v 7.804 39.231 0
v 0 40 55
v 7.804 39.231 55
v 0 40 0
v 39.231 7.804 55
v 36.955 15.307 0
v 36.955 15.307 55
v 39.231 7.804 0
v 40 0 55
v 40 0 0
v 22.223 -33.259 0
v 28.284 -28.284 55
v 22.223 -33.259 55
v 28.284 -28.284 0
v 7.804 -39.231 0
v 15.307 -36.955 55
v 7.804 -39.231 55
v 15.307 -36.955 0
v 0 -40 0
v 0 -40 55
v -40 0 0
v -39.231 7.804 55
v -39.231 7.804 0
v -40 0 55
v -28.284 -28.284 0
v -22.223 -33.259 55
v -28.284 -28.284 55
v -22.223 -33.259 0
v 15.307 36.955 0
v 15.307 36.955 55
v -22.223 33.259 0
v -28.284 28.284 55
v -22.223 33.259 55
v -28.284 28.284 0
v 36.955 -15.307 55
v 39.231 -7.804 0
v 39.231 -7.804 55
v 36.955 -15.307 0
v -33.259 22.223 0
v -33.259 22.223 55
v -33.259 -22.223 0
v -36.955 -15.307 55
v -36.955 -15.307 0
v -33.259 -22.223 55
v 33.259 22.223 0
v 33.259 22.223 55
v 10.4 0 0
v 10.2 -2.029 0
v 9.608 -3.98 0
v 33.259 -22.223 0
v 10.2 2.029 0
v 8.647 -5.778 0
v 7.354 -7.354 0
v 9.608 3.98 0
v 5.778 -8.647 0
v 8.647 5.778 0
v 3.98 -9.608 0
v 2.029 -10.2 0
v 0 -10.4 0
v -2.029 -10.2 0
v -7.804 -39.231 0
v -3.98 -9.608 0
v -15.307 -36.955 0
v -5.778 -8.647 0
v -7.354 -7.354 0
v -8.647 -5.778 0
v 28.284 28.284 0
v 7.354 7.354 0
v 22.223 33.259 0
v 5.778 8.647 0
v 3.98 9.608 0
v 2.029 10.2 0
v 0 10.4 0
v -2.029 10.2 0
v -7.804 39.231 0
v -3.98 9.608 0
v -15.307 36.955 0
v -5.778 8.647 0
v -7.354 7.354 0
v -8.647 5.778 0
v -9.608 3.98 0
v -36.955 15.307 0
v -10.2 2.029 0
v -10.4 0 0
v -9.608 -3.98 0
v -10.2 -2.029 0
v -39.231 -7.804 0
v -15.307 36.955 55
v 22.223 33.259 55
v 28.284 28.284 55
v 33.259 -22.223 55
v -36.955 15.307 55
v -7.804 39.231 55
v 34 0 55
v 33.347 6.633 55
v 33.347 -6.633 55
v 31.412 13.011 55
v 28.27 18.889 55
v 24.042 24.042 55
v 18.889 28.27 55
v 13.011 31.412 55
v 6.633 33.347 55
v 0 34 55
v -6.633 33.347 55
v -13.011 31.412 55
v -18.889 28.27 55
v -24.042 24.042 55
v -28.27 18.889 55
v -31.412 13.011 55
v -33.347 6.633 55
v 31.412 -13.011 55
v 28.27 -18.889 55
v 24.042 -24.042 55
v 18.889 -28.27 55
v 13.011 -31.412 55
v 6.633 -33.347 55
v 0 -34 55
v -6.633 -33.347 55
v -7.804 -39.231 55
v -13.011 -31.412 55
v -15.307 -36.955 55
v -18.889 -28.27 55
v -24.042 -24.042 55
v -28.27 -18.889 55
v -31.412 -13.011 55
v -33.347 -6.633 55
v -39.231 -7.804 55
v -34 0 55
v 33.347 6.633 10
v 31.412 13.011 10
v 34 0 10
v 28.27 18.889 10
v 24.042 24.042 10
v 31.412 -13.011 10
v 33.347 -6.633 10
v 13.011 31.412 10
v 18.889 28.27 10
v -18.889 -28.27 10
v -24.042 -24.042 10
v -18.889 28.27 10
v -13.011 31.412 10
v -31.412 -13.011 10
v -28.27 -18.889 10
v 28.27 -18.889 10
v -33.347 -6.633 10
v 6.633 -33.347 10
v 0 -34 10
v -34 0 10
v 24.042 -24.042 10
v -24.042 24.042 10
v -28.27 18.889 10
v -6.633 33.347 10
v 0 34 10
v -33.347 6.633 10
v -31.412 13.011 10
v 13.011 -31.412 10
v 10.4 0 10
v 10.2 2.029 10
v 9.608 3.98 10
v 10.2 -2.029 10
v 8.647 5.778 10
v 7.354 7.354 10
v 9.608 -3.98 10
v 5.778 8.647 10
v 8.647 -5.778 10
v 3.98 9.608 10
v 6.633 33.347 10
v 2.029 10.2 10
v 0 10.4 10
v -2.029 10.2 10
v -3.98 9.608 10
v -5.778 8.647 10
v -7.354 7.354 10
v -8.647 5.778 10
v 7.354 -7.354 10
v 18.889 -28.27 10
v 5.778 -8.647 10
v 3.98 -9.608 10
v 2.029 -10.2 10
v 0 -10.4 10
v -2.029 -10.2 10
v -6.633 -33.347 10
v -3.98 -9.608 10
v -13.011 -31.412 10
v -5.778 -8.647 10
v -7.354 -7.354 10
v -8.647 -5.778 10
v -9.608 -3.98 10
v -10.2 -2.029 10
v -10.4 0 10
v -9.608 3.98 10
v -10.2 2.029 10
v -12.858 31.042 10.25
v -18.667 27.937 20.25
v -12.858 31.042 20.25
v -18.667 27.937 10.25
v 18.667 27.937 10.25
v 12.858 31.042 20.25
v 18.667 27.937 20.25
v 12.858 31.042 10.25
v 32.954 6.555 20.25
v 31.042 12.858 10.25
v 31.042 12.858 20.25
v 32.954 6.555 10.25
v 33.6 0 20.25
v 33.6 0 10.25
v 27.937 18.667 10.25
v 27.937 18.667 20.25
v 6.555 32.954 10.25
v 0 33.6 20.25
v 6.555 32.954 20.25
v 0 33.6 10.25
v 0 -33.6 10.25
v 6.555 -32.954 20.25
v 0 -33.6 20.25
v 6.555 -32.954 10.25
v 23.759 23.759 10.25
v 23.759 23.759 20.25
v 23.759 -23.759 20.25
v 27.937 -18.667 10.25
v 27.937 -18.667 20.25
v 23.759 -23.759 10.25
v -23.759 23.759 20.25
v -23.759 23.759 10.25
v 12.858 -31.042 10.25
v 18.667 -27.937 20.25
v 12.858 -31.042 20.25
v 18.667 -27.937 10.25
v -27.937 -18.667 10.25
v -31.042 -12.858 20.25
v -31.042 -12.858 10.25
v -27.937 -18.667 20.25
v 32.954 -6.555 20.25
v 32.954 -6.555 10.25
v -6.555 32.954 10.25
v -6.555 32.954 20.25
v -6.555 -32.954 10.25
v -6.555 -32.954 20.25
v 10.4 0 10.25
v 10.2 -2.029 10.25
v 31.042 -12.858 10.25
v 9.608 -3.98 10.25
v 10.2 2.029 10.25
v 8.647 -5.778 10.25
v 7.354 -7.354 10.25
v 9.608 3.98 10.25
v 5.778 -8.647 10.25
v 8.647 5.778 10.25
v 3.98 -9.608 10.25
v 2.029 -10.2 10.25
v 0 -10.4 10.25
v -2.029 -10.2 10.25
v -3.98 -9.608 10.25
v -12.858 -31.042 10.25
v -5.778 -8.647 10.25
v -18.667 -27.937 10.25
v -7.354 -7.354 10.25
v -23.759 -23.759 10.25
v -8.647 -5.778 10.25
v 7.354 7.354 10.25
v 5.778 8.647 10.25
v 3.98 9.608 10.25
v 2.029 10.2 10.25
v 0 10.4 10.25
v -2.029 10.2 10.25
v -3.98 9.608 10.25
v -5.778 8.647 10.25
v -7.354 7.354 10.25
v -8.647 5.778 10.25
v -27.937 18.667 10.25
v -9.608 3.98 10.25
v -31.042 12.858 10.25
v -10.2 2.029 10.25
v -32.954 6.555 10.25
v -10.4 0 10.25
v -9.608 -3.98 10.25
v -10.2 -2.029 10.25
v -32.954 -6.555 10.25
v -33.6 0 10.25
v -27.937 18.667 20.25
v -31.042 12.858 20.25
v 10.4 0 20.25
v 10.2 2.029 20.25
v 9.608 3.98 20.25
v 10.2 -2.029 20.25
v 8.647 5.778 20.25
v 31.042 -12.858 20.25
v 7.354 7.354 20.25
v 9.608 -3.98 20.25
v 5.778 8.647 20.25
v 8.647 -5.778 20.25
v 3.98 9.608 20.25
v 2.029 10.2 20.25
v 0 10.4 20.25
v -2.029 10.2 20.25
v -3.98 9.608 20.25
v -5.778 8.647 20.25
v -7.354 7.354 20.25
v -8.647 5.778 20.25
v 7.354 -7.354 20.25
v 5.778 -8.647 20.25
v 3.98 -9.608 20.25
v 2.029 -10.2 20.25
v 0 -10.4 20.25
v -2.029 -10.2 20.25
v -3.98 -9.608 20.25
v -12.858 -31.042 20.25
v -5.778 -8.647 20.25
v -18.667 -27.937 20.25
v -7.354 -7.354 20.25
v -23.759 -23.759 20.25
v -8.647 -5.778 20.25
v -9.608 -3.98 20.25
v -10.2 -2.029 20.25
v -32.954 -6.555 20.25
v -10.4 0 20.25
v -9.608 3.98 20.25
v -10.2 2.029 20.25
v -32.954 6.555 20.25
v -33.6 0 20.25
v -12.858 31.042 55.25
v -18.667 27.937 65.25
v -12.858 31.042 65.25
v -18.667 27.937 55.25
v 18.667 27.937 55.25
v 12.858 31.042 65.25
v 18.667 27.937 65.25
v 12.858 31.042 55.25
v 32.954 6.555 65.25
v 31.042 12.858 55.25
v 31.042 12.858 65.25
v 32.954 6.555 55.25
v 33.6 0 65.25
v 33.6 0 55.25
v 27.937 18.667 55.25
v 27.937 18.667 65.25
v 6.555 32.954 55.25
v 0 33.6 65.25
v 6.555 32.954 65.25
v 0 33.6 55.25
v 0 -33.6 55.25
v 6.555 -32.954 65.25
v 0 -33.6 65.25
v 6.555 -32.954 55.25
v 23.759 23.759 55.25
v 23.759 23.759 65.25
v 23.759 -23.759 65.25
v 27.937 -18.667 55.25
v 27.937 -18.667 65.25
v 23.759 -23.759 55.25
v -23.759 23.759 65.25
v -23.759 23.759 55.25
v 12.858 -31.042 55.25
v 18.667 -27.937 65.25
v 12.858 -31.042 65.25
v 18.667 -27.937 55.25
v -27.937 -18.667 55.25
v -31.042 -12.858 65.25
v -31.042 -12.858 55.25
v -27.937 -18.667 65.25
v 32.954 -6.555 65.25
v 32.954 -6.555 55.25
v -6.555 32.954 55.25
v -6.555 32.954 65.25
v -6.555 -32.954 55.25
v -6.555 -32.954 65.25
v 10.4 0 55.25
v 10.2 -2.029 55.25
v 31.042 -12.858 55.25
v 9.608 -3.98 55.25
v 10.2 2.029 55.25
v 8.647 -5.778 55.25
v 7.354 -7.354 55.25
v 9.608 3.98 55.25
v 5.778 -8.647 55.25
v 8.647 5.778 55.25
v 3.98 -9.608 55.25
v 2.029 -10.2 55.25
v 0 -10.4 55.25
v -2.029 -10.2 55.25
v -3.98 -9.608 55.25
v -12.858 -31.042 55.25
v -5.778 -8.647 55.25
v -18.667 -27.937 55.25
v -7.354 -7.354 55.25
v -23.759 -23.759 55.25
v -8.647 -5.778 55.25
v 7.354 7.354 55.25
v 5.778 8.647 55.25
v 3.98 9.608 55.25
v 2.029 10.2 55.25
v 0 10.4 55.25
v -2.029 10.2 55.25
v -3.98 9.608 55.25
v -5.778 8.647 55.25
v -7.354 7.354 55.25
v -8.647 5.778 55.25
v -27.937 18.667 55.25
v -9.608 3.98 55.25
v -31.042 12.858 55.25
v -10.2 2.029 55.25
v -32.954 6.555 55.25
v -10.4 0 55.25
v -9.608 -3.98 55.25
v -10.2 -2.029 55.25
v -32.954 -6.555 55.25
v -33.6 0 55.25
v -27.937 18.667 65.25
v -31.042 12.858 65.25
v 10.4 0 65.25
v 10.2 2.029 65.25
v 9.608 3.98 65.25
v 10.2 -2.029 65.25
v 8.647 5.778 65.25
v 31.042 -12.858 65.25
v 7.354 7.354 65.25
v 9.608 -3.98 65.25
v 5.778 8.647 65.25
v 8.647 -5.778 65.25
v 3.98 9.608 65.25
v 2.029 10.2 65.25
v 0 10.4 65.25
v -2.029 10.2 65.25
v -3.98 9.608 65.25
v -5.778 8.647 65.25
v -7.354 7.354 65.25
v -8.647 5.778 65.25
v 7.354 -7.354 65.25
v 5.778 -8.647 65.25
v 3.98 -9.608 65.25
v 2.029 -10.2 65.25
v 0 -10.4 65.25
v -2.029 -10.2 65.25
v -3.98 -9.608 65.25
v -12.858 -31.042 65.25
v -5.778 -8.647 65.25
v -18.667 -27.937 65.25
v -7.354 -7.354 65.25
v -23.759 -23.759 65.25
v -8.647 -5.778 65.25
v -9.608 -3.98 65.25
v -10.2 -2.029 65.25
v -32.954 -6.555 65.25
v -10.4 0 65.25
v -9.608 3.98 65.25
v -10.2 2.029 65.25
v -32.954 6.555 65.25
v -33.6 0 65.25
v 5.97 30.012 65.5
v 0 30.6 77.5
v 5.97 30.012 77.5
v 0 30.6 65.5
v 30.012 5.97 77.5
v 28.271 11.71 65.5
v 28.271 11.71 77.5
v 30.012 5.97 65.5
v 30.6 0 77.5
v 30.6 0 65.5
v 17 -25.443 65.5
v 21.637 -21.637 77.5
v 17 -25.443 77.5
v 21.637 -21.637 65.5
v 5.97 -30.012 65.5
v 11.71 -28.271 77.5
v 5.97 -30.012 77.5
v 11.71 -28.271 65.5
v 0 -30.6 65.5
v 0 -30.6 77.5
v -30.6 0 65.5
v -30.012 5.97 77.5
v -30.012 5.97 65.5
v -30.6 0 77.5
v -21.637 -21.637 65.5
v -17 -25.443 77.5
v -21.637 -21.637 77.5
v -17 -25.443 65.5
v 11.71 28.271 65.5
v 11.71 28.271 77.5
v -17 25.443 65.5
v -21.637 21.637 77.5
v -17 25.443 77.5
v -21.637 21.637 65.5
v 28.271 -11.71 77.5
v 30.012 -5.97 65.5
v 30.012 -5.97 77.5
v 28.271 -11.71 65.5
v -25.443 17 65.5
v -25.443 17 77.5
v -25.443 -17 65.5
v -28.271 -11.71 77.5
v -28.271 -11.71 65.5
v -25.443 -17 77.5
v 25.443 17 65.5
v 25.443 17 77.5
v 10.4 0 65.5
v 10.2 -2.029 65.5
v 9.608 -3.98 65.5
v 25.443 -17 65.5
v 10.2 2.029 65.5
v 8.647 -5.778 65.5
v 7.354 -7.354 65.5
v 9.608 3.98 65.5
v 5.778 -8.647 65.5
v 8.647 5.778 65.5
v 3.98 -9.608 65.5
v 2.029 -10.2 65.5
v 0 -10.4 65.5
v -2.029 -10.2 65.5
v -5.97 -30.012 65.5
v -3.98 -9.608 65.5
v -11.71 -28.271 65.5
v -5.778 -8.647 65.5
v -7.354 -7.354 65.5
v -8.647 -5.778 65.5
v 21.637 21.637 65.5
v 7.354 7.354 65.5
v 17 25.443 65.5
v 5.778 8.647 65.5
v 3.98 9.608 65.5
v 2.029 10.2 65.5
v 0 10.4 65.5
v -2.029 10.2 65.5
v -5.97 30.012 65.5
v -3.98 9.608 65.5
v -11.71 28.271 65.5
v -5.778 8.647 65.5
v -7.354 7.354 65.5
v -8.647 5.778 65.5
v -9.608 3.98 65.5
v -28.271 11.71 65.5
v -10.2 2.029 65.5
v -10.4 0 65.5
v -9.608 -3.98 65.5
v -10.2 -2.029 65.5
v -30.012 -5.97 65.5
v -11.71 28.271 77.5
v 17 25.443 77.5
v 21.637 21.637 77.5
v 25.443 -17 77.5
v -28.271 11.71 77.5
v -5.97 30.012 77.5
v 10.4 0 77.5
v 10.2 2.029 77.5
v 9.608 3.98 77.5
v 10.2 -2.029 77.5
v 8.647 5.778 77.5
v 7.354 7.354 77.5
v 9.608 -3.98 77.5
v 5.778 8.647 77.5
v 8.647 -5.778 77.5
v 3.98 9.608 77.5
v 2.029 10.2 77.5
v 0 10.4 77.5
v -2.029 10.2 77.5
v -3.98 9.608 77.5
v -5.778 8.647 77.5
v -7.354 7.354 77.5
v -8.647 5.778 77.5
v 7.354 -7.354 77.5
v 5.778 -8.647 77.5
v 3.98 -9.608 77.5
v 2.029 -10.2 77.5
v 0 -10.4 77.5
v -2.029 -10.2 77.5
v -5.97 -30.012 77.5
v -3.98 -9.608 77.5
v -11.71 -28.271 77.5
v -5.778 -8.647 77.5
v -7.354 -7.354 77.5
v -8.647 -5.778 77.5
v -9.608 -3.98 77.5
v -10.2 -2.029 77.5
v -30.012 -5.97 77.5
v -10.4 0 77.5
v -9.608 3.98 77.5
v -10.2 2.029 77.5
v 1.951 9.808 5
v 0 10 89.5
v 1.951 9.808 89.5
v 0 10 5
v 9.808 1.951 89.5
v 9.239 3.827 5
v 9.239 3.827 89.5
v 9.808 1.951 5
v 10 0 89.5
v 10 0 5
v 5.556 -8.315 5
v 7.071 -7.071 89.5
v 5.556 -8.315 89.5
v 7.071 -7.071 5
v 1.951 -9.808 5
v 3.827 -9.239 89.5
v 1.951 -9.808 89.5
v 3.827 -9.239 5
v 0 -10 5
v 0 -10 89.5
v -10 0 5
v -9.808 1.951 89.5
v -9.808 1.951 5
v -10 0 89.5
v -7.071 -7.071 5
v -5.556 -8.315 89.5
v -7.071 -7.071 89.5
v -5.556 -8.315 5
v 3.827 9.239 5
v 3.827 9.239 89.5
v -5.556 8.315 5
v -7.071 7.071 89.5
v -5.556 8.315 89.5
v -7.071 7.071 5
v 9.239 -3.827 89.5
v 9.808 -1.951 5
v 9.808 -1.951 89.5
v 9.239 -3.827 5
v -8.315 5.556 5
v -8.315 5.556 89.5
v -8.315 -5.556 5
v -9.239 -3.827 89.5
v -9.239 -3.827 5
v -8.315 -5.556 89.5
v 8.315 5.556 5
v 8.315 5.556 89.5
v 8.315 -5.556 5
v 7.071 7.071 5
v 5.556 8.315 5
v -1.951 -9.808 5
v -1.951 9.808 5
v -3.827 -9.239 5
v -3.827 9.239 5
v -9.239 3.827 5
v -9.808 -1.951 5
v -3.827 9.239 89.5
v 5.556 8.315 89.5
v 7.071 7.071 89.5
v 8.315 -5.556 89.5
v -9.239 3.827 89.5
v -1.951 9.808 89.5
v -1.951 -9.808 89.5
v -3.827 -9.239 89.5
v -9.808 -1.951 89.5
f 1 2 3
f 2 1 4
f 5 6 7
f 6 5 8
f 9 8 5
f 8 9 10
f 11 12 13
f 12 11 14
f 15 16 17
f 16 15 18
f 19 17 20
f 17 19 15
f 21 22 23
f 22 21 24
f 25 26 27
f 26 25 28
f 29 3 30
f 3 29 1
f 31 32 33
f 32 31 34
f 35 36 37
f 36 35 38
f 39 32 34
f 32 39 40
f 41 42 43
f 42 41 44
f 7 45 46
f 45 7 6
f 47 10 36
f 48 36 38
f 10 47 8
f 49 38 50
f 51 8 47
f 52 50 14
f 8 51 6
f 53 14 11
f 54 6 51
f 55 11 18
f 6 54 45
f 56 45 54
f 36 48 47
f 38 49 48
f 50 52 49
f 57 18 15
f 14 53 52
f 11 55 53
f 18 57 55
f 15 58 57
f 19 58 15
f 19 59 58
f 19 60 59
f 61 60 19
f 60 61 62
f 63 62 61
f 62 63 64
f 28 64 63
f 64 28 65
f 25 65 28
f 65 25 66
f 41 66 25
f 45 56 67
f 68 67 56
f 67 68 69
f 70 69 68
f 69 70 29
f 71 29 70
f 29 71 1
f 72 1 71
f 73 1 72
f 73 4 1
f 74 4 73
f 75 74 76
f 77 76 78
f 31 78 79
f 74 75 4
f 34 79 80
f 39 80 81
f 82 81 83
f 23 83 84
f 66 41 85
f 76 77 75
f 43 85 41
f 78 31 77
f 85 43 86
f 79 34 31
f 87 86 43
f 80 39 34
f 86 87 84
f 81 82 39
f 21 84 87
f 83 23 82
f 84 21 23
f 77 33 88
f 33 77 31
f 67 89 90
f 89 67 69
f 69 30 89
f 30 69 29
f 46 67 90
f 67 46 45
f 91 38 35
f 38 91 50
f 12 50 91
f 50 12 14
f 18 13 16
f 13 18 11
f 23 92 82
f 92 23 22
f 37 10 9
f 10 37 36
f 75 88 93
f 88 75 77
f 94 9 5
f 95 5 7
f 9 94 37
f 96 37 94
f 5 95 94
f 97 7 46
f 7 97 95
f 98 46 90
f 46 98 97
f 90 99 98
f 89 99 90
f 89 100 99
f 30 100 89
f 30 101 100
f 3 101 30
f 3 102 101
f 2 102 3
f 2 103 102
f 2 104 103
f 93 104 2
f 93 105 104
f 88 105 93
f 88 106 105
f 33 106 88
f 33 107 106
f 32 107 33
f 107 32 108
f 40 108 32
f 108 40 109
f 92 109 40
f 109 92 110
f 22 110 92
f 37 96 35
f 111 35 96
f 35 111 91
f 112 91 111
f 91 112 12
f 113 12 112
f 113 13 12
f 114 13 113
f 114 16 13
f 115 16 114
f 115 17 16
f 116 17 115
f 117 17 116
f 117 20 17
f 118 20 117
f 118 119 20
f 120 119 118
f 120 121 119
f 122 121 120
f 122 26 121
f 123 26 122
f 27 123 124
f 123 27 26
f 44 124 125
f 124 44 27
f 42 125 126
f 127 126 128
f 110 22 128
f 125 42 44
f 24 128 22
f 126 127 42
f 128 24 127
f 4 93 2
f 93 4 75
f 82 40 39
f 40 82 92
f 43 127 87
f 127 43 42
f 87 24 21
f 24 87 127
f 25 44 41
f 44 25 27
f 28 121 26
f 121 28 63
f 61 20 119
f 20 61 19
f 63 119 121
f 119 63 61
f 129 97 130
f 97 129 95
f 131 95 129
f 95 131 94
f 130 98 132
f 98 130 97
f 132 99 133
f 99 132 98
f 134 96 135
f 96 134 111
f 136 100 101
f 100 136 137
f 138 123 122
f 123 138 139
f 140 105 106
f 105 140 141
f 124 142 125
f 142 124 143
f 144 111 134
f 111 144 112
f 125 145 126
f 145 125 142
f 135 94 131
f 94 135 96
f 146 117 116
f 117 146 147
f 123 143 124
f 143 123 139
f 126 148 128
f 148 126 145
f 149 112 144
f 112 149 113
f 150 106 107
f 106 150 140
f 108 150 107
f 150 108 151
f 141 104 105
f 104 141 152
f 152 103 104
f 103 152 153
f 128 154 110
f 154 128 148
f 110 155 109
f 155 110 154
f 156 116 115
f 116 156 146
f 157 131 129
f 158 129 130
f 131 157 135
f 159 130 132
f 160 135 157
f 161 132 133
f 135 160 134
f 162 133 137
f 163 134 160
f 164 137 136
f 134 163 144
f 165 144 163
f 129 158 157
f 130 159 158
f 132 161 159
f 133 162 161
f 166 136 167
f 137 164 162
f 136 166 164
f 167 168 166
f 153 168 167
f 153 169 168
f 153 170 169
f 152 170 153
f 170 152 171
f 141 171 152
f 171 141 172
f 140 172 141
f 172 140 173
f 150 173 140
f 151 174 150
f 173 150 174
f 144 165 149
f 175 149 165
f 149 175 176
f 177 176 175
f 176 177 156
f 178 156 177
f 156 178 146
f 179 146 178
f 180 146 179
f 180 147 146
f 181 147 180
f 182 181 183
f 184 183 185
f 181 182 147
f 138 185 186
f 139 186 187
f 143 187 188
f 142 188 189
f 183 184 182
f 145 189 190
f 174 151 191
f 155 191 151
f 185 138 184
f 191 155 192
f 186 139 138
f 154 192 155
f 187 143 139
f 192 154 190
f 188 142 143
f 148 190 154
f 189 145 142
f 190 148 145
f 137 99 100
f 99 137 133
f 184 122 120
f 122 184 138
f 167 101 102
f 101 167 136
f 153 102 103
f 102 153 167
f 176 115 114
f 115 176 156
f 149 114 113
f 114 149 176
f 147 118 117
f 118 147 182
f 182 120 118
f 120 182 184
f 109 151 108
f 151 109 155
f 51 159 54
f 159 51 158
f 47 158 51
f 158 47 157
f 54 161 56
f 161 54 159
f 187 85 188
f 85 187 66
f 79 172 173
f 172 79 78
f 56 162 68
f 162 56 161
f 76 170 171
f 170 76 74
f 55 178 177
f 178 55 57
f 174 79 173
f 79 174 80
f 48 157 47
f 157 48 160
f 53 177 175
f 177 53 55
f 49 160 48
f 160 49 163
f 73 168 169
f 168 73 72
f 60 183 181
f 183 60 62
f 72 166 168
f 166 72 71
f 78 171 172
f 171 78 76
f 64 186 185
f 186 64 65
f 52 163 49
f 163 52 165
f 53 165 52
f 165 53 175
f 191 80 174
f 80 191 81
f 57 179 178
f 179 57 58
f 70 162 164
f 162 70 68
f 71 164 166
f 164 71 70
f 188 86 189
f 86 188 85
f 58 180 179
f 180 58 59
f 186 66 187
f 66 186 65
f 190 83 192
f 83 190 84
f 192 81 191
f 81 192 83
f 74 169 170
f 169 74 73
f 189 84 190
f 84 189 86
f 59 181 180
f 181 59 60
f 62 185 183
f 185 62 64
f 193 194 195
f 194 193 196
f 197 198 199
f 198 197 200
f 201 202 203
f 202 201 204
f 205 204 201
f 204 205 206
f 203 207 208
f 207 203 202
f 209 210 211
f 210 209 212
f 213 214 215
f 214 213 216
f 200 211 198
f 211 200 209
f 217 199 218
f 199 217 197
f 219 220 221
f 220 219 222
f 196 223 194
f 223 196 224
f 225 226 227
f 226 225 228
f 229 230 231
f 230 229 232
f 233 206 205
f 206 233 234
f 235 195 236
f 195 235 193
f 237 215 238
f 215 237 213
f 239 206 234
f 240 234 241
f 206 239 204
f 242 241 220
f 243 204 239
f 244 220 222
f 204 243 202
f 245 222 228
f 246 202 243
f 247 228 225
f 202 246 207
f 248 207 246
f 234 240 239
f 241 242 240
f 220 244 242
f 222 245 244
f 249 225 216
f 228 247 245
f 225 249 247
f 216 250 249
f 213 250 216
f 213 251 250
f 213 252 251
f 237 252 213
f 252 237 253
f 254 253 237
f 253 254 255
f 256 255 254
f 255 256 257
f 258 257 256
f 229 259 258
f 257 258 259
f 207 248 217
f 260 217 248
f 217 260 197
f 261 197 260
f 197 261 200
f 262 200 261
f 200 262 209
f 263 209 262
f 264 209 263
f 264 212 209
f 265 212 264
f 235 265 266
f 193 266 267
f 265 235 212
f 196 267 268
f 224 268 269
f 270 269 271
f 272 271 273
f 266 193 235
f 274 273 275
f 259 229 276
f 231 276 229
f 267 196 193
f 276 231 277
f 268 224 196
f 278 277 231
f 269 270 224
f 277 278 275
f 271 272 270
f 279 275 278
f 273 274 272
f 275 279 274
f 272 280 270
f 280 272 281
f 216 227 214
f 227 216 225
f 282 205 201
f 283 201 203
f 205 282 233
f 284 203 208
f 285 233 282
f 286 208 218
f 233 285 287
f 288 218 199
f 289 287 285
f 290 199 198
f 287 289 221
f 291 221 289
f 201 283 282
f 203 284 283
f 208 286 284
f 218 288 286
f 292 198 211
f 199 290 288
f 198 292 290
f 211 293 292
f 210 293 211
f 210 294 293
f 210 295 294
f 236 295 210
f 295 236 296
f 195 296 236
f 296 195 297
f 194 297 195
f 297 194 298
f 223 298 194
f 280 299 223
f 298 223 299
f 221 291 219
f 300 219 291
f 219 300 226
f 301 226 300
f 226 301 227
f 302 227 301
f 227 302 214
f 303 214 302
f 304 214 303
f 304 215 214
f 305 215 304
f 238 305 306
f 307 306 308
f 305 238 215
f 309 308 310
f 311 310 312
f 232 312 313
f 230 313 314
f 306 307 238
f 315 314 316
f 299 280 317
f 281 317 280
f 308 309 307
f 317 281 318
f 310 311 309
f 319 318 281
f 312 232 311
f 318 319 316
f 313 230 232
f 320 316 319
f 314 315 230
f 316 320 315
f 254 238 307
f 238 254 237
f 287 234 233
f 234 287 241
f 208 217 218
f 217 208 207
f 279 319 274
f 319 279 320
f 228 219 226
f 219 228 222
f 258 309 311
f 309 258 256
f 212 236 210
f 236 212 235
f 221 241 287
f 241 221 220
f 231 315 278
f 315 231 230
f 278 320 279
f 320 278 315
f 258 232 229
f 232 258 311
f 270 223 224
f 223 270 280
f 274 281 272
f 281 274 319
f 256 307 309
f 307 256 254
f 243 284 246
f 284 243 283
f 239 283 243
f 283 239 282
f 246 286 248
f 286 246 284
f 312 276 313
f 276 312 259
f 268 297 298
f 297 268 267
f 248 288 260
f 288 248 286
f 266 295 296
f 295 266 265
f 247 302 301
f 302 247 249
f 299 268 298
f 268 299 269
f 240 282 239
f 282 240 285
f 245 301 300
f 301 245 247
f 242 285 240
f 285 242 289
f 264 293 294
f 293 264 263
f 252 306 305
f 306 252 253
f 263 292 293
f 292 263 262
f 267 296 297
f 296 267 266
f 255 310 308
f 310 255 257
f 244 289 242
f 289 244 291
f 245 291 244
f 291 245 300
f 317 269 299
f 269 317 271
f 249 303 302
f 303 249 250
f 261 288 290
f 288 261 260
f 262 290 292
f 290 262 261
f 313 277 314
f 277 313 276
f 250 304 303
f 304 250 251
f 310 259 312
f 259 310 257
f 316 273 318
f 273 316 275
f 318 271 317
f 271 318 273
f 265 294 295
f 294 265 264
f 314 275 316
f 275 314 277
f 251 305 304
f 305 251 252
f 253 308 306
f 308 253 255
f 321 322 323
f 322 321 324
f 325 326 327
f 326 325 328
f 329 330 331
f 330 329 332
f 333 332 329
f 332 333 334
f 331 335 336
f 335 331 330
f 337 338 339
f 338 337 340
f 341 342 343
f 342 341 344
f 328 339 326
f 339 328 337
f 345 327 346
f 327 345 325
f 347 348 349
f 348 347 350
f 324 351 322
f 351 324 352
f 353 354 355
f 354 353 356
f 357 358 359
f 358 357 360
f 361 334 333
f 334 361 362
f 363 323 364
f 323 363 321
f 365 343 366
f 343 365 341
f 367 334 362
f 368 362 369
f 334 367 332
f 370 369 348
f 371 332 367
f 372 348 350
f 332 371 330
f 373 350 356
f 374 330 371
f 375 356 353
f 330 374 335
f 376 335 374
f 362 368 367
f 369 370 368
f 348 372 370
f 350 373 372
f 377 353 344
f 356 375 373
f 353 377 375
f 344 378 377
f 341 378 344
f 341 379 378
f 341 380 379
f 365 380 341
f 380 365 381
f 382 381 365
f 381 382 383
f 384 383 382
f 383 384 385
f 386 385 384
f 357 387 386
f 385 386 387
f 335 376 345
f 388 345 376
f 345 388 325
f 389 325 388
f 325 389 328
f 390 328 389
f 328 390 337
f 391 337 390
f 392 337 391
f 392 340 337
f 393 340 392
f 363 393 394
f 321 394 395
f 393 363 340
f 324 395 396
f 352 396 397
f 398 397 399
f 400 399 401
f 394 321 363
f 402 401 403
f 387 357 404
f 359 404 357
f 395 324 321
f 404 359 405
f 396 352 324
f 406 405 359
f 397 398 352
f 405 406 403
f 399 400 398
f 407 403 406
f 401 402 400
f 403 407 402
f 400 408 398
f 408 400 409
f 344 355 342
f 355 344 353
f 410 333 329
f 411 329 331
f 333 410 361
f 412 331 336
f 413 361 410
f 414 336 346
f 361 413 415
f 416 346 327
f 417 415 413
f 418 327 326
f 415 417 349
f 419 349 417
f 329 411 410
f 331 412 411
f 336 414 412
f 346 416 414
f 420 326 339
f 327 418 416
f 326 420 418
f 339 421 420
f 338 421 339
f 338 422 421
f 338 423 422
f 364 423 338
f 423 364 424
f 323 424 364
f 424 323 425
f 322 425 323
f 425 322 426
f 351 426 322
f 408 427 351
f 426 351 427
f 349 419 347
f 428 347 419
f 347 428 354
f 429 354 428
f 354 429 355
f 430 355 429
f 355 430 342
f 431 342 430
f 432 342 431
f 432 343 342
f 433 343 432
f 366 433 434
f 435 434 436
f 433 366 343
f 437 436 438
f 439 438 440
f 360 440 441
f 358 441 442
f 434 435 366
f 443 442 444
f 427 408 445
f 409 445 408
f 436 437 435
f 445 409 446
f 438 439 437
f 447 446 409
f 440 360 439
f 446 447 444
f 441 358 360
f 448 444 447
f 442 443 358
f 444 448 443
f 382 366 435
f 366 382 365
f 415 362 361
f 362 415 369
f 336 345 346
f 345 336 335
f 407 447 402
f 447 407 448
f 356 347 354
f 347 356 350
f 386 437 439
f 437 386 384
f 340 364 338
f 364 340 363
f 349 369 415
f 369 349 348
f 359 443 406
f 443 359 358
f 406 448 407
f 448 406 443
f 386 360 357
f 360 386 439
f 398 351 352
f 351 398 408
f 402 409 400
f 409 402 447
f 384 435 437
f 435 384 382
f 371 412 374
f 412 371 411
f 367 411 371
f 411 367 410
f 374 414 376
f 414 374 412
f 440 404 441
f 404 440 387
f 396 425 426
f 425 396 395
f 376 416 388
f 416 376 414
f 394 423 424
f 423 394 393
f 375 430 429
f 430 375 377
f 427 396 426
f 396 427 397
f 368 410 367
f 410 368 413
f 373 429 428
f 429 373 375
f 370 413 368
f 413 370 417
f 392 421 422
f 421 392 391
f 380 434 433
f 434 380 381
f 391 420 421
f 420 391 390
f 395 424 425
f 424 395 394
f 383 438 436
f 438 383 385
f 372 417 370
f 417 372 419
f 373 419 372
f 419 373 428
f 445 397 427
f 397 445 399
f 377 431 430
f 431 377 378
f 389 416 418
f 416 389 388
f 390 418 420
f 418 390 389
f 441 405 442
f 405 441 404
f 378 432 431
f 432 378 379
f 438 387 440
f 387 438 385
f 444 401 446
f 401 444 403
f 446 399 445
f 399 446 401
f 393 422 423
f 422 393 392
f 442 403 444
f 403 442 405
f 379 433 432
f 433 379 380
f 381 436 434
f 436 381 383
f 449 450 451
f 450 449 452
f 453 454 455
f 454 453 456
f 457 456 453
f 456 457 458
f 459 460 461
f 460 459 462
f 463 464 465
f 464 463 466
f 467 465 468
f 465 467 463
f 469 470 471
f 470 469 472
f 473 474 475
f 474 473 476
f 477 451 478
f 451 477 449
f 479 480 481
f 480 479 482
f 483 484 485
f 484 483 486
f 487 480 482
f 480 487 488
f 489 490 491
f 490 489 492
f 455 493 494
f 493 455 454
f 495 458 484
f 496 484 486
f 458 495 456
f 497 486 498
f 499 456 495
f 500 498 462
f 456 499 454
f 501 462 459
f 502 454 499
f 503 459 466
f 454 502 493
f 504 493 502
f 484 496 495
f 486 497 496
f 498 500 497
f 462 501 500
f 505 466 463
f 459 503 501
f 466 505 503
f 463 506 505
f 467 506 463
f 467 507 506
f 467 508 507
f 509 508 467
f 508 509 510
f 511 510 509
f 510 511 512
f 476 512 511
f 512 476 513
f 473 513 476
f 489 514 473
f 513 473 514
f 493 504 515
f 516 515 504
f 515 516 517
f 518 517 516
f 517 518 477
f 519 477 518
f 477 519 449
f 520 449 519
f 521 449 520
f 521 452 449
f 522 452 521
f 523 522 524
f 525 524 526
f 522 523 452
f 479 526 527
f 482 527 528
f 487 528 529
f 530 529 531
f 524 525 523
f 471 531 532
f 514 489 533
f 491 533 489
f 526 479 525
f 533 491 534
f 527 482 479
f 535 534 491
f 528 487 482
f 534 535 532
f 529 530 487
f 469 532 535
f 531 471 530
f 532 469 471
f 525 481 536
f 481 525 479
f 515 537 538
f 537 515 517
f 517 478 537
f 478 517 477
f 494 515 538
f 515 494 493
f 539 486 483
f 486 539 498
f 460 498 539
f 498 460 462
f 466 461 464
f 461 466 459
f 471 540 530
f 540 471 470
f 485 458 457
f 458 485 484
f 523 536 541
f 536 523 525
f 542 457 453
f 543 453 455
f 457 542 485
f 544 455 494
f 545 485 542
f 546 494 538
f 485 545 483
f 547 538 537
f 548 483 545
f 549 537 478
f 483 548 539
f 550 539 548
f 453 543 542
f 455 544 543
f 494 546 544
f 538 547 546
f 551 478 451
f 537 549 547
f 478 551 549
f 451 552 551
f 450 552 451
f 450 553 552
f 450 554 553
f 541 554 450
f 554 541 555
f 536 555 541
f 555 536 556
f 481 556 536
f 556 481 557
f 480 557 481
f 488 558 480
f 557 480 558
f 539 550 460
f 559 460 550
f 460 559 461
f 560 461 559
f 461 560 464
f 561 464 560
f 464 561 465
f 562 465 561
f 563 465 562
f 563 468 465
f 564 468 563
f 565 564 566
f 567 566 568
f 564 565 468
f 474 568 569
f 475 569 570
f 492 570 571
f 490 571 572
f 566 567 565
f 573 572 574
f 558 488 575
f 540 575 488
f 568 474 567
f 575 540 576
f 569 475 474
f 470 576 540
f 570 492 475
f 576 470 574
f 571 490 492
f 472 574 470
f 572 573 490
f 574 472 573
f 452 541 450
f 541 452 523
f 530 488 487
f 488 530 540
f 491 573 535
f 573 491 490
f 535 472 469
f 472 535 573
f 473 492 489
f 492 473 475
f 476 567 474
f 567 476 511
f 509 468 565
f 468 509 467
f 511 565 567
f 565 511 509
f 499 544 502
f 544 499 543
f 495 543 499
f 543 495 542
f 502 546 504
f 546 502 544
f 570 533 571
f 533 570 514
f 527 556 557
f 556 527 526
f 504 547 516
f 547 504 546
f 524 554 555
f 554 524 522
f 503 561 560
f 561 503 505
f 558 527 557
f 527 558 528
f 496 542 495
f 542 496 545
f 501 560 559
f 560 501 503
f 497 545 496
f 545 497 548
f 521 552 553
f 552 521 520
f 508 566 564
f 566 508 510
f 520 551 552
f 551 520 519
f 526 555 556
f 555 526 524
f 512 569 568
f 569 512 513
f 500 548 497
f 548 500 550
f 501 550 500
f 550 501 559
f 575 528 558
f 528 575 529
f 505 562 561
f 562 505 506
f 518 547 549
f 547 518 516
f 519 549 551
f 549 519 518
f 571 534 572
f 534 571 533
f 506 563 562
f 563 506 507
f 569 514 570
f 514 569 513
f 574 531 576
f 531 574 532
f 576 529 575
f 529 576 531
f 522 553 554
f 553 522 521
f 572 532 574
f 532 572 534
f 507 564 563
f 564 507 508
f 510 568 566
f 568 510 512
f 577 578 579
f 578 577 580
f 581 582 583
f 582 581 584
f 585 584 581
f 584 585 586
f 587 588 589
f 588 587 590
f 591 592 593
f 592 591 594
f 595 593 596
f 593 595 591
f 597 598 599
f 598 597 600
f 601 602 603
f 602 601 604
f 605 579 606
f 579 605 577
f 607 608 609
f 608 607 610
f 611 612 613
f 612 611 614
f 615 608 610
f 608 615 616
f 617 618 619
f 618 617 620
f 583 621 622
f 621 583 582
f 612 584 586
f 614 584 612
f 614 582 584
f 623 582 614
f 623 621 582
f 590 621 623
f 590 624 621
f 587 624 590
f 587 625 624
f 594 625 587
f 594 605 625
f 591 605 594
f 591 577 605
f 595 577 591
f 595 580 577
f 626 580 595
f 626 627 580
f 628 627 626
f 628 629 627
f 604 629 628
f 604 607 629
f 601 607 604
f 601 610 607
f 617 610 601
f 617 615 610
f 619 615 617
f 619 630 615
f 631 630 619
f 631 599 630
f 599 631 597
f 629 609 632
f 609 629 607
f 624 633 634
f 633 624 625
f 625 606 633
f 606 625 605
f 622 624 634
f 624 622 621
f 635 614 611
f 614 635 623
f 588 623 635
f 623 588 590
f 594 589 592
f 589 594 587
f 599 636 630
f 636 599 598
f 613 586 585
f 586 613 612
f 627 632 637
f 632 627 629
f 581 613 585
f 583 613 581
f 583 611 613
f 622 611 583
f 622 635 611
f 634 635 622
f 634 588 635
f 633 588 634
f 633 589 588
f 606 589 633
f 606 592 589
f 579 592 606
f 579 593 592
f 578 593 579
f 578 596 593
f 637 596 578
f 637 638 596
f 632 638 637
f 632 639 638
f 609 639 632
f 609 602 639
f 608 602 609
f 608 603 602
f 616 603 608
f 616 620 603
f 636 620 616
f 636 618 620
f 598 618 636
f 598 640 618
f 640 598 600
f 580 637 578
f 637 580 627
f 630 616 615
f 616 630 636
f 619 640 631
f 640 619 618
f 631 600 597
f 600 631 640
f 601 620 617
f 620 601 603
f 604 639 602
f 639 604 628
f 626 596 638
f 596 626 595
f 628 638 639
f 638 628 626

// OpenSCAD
$fn = 32;

// ------------------------------------------------------------------------
// Bearing housing: housing d80, two bearings and a shaft
// Every part is its own module, assembly() places them once.
// ------------------------------------------------------------------------

// --- part 1 ---
module housing() {
  difference() {
    cylinder(h = 55, d = 80);
    translate([0, 0, 10]) cylinder(h = 46, d = 68);
    translate([0, 0, -1]) cylinder(h = 12, d = 20.8);
  }
}

// --- part 2 ---
module bearing_lower() {
  difference() {
      translate([0, 0, 0]) cylinder(h = 10, d = 67.2);
      translate([0, 0, -1]) cylinder(h = 12, d = 20.8);
    }
}

// --- part 3 ---
module bearing_upper() {
  difference() {
      translate([0, 0, 0]) cylinder(h = 10, d = 67.2);
      translate([0, 0, -1]) cylinder(h = 12, d = 20.8);
    }
}

// --- part 4 ---
module spacer() {
  difference() {
      translate([0, 0, 0]) cylinder(h = 12, d = 61.2);
      translate([0, 0, -1]) cylinder(h = 14, d = 20.8);
    }
}

// --- part 5 ---
module shaft() {
  translate([0, 0, -42.25]) cylinder(h = 84.5, d = 20);
}

// --- assembly ---
module assembly() {
  translate([0, 0, 0]) rotate([0, 0, 0]) housing();
  translate([0, 0, 10.25]) rotate([0, 0, 0]) bearing_lower();
  translate([0, 0, 55.25]) rotate([0, 0, 0]) bearing_upper();
  translate([0, 0, 65.5]) rotate([0, 0, 0]) spacer();
  translate([0, 0, 47.25]) rotate([0, 0, 0]) shaft();
}

assembly();
